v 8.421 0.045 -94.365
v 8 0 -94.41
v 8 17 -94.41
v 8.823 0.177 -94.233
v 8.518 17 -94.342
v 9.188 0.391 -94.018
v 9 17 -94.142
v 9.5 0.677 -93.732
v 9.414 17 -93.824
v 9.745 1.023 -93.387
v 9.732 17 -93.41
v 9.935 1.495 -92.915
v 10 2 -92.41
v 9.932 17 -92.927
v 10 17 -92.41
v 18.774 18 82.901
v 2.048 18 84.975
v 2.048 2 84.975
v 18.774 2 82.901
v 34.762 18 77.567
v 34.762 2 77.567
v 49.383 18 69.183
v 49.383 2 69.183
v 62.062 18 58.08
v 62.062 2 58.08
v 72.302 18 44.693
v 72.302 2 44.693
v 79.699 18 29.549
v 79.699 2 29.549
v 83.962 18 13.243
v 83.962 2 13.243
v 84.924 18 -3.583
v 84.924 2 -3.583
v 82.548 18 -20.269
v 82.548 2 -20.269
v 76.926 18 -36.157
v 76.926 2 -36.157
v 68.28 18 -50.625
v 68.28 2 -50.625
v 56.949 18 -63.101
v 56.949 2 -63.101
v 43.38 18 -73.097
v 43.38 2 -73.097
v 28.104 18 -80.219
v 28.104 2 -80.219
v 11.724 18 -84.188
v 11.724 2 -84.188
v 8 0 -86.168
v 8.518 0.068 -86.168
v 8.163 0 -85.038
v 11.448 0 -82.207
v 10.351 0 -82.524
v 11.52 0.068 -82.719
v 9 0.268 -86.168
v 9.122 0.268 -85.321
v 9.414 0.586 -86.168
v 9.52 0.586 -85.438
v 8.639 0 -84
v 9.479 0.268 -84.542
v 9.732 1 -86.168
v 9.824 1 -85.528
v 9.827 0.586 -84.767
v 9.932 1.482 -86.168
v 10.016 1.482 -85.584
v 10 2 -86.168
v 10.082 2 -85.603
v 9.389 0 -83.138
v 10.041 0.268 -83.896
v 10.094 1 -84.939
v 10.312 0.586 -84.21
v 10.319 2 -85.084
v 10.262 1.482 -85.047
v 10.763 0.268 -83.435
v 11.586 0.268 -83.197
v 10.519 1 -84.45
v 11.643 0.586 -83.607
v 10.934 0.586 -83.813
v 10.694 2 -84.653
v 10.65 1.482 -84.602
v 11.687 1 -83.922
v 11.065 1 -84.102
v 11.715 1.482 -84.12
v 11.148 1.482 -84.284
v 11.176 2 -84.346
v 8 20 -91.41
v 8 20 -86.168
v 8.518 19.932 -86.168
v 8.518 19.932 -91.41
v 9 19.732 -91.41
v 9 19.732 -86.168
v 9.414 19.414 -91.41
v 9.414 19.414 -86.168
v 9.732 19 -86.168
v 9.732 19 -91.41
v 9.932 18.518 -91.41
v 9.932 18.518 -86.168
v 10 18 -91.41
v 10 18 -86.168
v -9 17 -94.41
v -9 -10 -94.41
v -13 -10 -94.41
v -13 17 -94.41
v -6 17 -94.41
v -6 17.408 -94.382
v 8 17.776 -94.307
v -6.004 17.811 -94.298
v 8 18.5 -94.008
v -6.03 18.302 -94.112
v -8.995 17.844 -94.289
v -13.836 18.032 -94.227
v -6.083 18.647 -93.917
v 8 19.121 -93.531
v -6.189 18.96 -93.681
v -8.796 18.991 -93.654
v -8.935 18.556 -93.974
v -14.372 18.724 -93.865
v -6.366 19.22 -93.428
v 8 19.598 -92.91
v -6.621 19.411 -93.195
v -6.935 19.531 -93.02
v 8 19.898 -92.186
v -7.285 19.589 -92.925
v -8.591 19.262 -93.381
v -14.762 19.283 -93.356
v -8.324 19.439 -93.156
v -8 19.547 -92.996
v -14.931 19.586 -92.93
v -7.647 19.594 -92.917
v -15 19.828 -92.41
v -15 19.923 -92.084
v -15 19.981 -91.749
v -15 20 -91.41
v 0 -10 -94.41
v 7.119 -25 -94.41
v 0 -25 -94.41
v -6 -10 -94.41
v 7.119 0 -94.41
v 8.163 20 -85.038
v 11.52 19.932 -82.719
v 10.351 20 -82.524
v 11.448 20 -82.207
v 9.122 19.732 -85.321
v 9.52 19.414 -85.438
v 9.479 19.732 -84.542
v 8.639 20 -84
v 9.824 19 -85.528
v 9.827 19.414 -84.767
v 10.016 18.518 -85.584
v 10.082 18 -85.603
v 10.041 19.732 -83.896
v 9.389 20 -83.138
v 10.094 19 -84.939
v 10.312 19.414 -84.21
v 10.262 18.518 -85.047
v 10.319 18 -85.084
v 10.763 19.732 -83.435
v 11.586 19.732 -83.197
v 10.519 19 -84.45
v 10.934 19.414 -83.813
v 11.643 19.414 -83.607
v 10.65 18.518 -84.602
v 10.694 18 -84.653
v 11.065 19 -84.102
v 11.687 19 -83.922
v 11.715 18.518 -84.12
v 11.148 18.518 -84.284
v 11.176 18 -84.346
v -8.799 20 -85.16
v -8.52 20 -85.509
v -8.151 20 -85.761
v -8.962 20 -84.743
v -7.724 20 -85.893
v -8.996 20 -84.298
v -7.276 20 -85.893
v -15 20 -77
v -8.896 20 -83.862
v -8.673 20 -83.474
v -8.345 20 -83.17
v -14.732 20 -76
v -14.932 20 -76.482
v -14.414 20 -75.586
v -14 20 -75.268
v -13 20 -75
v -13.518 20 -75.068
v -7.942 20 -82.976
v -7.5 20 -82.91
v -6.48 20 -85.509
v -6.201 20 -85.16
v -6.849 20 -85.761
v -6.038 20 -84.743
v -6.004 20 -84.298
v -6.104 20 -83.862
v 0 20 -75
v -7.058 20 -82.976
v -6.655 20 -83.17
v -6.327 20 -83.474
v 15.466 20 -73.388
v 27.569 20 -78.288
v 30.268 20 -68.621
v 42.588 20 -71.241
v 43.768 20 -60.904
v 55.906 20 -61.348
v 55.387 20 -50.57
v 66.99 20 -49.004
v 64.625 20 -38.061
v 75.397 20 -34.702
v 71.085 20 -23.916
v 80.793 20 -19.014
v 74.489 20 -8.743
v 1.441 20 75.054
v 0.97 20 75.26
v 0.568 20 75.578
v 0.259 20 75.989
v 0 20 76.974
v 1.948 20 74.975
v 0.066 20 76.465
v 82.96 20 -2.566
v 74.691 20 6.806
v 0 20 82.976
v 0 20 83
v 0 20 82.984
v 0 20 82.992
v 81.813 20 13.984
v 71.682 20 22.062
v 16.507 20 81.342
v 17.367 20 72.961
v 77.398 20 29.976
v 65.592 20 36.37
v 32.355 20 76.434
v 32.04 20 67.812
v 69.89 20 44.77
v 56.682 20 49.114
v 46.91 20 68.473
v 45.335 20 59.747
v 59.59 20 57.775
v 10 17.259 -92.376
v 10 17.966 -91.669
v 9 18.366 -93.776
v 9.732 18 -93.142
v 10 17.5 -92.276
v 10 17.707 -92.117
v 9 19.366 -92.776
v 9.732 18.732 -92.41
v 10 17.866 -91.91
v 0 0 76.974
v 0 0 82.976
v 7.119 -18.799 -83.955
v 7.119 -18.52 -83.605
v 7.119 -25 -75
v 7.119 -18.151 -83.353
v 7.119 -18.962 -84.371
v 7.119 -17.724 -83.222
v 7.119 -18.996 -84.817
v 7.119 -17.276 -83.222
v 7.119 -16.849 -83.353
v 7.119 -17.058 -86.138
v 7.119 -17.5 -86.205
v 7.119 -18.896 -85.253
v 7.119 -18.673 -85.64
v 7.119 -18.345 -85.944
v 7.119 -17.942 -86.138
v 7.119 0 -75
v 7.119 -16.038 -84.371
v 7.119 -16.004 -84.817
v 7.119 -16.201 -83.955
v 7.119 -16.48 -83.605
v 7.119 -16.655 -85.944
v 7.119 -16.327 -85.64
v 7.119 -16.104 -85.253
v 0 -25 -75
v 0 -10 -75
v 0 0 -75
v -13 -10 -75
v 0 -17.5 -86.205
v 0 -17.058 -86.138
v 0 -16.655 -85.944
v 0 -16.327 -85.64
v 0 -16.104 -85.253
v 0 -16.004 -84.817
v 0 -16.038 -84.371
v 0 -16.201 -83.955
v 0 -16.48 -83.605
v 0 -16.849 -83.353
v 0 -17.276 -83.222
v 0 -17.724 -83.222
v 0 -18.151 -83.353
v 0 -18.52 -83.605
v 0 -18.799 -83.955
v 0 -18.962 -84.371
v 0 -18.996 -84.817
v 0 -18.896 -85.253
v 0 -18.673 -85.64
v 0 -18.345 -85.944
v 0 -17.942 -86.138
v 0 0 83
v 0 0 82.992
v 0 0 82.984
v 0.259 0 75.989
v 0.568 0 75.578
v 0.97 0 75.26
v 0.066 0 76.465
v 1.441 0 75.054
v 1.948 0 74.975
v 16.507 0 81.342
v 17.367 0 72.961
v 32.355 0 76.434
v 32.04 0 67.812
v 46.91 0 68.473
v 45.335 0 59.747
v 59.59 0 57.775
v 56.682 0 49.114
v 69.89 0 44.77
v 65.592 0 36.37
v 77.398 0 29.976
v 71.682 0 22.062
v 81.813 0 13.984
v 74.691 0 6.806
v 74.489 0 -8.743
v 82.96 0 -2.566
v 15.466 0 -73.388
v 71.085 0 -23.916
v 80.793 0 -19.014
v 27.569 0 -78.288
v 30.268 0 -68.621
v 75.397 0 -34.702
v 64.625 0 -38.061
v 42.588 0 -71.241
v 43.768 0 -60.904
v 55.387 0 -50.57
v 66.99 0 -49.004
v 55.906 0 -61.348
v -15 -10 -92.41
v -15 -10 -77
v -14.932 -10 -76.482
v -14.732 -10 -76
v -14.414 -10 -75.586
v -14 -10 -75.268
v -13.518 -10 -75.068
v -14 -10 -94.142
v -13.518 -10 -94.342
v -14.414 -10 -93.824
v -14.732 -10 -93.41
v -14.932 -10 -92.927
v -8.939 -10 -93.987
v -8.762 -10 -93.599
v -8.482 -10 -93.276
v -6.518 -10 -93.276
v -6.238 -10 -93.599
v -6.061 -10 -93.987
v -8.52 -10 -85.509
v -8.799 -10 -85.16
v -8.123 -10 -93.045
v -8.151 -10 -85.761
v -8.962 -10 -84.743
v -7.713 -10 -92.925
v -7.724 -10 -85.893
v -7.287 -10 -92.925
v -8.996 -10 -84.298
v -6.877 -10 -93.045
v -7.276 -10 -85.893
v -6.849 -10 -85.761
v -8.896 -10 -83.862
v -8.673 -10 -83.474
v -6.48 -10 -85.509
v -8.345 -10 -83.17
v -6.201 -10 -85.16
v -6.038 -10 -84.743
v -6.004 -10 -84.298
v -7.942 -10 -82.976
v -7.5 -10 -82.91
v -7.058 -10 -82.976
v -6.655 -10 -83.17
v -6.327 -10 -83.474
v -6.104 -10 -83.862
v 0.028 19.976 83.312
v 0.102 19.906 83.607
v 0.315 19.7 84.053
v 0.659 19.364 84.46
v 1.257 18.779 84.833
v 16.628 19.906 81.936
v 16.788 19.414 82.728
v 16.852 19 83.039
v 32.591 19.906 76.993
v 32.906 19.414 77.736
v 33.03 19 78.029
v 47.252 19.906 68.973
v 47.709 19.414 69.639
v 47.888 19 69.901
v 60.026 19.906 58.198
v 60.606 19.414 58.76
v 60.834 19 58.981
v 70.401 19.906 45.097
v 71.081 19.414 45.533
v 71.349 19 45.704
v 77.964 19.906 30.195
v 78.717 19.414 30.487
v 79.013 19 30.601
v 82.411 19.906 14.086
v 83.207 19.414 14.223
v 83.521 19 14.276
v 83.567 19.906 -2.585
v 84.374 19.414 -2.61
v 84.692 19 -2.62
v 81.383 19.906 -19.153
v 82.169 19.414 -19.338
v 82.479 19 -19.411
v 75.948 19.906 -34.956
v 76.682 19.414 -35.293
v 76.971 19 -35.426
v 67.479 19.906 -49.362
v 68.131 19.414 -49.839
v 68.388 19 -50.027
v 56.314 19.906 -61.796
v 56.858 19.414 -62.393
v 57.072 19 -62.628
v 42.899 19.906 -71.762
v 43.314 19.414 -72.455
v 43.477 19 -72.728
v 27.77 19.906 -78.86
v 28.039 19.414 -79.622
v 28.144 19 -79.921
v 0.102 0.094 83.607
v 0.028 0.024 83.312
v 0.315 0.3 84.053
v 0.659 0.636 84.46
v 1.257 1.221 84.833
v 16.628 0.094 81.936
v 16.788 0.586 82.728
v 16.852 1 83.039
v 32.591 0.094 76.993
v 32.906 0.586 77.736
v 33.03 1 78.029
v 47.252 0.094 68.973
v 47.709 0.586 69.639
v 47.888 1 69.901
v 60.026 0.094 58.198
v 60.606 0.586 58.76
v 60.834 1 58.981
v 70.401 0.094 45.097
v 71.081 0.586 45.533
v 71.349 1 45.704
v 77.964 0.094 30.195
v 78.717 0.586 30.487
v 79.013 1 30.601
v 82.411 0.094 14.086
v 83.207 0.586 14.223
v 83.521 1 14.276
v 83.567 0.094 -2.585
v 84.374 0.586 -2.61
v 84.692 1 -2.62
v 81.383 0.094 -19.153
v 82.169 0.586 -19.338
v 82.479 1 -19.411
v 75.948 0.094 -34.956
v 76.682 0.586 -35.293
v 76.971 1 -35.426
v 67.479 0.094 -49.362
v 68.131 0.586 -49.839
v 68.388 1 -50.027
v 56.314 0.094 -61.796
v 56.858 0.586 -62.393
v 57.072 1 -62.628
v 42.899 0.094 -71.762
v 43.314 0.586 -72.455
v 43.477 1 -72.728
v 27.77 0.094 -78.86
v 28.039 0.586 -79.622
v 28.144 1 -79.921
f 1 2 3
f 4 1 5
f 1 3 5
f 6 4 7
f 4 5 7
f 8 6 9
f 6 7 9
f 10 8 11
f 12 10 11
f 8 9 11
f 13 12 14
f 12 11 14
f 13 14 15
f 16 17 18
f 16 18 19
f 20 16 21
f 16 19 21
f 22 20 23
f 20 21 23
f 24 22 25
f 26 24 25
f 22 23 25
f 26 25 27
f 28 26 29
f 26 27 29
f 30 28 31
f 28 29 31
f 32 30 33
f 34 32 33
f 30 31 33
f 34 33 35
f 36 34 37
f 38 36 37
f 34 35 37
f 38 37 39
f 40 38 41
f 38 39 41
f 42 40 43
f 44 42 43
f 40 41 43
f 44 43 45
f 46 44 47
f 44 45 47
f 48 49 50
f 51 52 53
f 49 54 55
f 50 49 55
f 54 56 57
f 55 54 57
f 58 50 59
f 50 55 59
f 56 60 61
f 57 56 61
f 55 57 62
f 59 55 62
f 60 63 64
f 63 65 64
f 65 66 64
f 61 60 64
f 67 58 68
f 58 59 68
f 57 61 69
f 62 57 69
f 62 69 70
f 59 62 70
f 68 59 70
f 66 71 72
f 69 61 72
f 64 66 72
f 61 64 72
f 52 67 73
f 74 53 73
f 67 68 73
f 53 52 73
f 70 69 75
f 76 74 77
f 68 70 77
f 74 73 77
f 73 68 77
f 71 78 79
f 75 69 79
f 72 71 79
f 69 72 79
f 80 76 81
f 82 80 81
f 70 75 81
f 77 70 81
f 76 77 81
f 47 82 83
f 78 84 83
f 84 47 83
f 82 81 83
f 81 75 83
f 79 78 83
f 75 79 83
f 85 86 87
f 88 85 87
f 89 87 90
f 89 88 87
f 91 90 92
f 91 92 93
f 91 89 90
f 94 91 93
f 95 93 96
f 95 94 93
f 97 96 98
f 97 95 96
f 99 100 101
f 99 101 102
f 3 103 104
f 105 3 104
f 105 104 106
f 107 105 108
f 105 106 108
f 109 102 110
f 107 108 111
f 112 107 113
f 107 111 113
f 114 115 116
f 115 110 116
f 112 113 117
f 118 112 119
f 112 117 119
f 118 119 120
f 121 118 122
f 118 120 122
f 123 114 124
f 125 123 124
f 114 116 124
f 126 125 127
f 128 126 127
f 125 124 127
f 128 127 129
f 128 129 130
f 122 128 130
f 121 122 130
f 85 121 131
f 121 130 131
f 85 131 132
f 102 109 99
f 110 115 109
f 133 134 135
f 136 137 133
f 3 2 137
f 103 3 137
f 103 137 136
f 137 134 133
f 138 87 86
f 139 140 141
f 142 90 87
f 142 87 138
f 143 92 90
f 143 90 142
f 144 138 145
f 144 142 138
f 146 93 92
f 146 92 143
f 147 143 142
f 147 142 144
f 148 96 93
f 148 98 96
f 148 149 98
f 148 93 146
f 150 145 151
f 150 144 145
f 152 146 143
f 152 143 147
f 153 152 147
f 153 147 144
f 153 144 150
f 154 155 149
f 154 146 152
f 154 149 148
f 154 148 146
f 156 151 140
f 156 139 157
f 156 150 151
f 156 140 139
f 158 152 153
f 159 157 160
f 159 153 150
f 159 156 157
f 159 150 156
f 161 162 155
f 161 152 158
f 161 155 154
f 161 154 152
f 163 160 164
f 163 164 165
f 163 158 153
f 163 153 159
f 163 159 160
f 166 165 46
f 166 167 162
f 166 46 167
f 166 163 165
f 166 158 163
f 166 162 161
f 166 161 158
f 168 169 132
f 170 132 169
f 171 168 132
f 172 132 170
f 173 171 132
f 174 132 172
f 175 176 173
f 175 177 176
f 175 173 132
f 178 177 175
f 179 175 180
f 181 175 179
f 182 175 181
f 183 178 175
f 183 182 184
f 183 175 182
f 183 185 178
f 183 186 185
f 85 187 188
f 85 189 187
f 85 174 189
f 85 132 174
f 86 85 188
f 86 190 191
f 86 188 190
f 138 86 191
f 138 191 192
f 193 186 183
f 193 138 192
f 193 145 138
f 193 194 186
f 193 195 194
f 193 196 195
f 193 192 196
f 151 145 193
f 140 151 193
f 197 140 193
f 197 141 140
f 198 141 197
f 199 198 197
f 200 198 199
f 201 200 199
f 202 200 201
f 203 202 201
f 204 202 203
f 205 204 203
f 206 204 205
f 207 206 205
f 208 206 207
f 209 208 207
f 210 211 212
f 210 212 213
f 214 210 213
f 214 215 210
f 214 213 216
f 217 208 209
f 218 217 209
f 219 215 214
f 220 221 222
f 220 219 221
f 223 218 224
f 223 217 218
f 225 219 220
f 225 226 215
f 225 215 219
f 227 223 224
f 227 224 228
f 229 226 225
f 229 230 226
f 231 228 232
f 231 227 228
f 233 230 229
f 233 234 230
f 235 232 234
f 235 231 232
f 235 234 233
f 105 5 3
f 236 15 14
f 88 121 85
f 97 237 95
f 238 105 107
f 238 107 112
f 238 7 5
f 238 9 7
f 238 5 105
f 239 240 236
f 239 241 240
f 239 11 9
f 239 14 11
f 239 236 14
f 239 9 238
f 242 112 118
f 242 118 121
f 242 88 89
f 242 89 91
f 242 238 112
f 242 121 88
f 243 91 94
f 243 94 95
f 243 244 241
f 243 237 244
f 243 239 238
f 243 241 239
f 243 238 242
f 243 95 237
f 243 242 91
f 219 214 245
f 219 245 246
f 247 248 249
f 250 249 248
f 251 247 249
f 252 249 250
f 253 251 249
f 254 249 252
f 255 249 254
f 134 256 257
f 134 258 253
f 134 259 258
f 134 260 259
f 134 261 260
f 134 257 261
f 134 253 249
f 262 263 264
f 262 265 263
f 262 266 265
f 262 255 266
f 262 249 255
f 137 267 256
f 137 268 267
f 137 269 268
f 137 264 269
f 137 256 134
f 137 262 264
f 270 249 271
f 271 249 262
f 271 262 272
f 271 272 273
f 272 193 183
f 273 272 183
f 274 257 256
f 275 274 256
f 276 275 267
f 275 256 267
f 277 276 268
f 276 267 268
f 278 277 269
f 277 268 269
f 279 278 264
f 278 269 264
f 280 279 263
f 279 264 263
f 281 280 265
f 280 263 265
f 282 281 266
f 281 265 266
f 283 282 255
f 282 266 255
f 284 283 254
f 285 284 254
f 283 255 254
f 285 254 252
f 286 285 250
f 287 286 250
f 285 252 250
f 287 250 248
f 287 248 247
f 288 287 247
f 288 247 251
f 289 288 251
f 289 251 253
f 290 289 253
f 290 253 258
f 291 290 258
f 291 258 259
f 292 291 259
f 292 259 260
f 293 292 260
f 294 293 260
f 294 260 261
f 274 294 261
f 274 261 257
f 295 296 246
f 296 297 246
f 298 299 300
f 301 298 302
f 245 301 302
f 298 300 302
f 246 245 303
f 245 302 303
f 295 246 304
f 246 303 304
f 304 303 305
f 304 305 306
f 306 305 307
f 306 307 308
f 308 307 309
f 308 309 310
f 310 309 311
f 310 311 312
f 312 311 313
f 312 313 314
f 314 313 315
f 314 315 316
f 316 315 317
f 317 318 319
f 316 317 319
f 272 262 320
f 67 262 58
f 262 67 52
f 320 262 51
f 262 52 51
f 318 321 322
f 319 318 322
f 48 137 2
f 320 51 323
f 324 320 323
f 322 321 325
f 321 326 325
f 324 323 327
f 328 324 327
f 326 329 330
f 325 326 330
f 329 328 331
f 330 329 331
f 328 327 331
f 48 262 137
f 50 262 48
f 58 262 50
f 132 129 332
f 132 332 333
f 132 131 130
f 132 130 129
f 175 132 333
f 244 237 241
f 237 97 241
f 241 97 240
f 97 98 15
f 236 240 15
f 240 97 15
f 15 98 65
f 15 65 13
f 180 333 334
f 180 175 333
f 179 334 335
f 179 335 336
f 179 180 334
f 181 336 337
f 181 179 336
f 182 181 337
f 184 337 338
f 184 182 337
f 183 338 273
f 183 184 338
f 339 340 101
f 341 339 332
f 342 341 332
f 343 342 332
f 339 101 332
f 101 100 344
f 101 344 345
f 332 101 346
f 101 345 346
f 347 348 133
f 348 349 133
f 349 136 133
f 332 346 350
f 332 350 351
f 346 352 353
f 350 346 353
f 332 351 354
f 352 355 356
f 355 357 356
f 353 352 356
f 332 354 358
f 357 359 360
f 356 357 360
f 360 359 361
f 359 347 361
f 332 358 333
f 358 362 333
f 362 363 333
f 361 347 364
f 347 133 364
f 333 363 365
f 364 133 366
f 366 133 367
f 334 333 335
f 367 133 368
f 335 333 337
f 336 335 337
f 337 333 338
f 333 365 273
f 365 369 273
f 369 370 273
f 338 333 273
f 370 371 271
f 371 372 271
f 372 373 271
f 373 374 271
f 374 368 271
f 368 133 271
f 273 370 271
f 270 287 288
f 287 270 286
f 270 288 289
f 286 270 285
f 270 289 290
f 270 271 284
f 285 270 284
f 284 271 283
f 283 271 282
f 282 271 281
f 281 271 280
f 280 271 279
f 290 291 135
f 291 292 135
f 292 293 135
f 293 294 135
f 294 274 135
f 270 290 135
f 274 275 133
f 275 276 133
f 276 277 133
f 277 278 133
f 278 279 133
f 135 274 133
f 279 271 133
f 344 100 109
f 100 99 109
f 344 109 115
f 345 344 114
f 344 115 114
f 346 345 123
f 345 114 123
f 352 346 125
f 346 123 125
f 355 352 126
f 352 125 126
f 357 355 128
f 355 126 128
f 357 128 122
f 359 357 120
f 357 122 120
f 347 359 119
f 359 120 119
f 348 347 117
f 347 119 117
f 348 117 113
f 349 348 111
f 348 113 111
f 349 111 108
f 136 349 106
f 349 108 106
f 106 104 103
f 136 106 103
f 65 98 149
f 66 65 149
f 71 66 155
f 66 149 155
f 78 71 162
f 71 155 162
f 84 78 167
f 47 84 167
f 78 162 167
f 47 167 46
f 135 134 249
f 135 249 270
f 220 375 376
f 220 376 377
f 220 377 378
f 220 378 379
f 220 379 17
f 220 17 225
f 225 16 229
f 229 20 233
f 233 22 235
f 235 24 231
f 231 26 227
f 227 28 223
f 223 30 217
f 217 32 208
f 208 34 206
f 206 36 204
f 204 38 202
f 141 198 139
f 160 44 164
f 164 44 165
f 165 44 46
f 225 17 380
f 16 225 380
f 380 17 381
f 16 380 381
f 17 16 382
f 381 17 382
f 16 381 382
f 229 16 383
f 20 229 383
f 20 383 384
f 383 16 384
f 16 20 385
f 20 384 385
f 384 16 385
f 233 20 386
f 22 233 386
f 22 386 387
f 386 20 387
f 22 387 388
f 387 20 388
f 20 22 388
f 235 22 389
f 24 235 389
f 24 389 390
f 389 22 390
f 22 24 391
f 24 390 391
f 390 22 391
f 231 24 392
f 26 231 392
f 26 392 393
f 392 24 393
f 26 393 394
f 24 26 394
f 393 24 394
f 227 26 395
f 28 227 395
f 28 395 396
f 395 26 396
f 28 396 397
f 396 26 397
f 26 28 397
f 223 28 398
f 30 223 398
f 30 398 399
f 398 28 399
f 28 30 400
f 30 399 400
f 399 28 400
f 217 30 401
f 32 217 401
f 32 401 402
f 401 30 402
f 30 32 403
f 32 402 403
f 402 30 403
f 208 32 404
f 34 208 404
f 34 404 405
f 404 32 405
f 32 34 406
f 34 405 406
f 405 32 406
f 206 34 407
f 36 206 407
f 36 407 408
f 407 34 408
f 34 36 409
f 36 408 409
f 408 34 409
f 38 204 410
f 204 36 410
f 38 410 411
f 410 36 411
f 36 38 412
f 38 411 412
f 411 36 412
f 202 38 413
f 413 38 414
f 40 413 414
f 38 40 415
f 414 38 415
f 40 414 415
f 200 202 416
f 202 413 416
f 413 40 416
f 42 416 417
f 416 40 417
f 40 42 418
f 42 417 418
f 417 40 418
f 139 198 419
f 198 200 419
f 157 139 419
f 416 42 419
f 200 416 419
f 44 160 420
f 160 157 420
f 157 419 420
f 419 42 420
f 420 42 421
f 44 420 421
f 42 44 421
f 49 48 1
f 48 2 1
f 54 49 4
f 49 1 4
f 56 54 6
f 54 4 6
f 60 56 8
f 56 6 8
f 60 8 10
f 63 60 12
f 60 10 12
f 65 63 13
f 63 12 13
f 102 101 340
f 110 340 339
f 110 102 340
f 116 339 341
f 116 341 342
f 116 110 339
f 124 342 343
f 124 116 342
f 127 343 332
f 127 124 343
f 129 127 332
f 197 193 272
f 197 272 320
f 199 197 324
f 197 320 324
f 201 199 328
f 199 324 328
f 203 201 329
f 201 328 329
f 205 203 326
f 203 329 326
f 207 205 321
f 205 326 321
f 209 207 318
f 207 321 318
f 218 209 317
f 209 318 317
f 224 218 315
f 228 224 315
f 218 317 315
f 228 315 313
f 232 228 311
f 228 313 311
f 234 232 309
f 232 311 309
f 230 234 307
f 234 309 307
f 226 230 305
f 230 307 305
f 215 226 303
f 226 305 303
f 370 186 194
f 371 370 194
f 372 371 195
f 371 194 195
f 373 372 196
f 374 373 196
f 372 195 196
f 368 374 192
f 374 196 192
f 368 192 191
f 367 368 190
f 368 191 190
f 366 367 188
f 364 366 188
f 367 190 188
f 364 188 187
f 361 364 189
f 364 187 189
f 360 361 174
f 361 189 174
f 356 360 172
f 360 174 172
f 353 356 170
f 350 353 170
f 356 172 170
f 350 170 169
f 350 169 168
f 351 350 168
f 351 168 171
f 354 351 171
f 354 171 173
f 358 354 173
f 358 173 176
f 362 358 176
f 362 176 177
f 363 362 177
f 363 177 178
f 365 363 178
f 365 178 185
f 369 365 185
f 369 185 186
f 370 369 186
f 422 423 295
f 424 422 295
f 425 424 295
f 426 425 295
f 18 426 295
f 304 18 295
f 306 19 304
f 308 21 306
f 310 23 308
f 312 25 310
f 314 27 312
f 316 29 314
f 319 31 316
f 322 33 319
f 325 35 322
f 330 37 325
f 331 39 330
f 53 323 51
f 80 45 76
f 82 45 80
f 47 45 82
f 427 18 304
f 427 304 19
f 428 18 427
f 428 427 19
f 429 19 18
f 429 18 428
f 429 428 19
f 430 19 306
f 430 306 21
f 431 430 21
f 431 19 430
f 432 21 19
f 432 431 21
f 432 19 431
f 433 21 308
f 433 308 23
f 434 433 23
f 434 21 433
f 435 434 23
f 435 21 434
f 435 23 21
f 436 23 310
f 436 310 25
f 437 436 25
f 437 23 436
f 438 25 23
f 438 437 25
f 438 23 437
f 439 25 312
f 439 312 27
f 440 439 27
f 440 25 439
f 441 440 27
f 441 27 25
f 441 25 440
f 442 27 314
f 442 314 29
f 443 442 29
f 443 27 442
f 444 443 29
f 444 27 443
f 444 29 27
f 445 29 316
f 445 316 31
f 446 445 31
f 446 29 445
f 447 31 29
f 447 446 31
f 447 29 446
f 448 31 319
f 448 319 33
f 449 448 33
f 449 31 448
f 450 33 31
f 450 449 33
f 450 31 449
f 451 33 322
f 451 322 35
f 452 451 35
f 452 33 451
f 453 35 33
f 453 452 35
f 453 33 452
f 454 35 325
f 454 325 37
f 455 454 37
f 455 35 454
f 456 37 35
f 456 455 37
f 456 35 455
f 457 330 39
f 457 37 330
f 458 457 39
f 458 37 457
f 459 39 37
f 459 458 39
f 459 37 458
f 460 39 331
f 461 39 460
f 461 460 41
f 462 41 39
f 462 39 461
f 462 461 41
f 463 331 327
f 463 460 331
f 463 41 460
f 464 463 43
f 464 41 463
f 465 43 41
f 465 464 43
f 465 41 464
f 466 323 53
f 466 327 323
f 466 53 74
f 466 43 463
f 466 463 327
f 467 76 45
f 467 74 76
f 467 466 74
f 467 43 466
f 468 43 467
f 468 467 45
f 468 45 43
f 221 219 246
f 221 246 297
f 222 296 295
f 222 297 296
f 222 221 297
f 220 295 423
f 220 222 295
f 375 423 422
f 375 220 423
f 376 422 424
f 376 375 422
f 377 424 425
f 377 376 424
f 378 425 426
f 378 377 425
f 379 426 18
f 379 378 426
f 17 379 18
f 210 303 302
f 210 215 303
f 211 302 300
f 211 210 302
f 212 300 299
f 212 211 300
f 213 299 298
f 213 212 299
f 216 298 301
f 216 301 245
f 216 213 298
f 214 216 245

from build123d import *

# Parameters (mm, degrees)
BOSS_EXTRUDE1_DEPTH = 20
SKETCH3_W           = 19.409715081
SKETCH3_H           = 30
BOSS_EXTRUDE3_DEPTH = 15
FILLET1_R           = 2
SKETCH4_R           = 1.5
CUT_EXTRUDE1_DEPTH  = 131.530434453
FILLET2_R           = 3
SKETCH7_W           = 7.118887736
SKETCH7_H           = 19.409715081
BOSS_EXTRUDE5_DEPTH = 25
CUT_EXTRUDE3_REACH  = 126.915
SKETCH9_R           = 1.5


with BuildPart() as part:
    # Sketch1 → Boss-Extrude1 (new body)
    with BuildSketch(Plane(origin=(0, 0, 0), x_dir=(1, 0, 0), z_dir=(0, 1, 0))):
        with BuildLine():
            Line((0, -75), (0, -85))
            ThreePointArc((0, -85), (84.852300446, -5.008703332), (10, 84.409715081))
            Line((10, 84.409715081), (10, 94.409715081))
            Line((10, 94.409715081), (0, 94.409715081))
            Line((0, 94.409715081), (0, 75))
            ThreePointArc((0, 75), (75, 0), (0, -75))
        make_face()
    extrude(amount=BOSS_EXTRUDE1_DEPTH)

    # Sketch3 → Boss-Extrude3 (add)
    with BuildSketch(Plane.ZY):
        with Locations((-84.704857541, 5)):
            Rectangle(SKETCH3_W, SKETCH3_H)
    extrude(amount=BOSS_EXTRUDE3_DEPTH)

    # Fillet1
    fillet1_edges = [part.edges().sort_by_distance(p)[0] for p in [
        (84.852300446, 20, 5.008703332),
        (10, 10, -94.409715081),
        (10, 10, -84.409715081),
        (0, 10, 85),
        (0, 10, 75),
        (10, 20, -89.409715081),
        (-15, 5, -94.409715081),
        (-15, 5, -75),
        (10, 0, -89.409715081),
        (84.852300446, 0, 5.008703332),
    ]]
    fillet(fillet1_edges, radius=FILLET1_R)

    # Sketch4 → Cut-Extrude1 (cut, through all)
    with BuildSketch(Plane(origin=(0, 20, 0), x_dir=(1, 0, 0), z_dir=(0, 1, 0))):
        with Locations(Location((-7.5, 84.409715081, 0), (0, 0, 270))):
            Circle(SKETCH4_R)
        with Locations((-7.5, 94.409715081)):
            Circle(SKETCH4_R)
    extrude(amount=-CUT_EXTRUDE1_DEPTH, mode=Mode.SUBTRACT)

    # Fillet2
    # the kernel refuses this fillet: 3 mm, written as the material it takes off along each edge
    with BuildSketch(Plane(origin=(10, 17, -91.409715081), x_dir=(0, 0, -1), z_dir=(0, -1, 0))) as fillet2_piece_1:
        with BuildLine():
            CenterArc((1, -2), 2, 0, 90)
            Line((3, -2), (3, 0))
            Line((3, 0), (1, 0))
        make_face()
    revolve(axis=Axis((10, 17, -91.409715081), (1, 0, 0)), revolution_arc=90, mode=Mode.SUBTRACT)
    with BuildSketch(Plane(origin=(-20.5, 20, -94.409715081), x_dir=(0, 0, 1), z_dir=(1, 0, 0))) as fillet2_piece_2:
        with BuildLine():
            CenterArc((FILLET2_R, FILLET2_R), FILLET2_R, 180, 90)
            Line((0, FILLET2_R), (0, 0))
            Line((0, 0), (FILLET2_R, 0))
        make_face()
    extrude(amount=19, mode=Mode.SUBTRACT)
    with BuildSketch(Plane(origin=(-13.5, 20, -94.409715081), x_dir=(0, -1, 0), z_dir=(1, 0, 0))) as fillet2_piece_3:
        with BuildLine():
            CenterArc((FILLET2_R, -FILLET2_R), FILLET2_R, 90, 90)
            Line((0, -FILLET2_R), (0, 0))
            Line((0, 0), (FILLET2_R, 0))
        make_face()
    extrude(amount=23.5, mode=Mode.SUBTRACT)

    # Sketch7 → Boss-Extrude5 (add)
    with BuildSketch(Plane(origin=(0, 0, 0), x_dir=(-1, 0, 0), z_dir=(0, -1, 0))):
        with Locations((-3.559443868, 84.704857541)):
            Rectangle(SKETCH7_W, SKETCH7_H)
    extrude(amount=BOSS_EXTRUDE5_DEPTH)

    # Sketch9 → Cut-Extrude3 (cut, up to next)
    with BuildSketch(Plane(origin=(7.118887736, 0, 0), x_dir=(0, 0, -1), z_dir=(1, 0, 0)), mode=Mode.PRIVATE) as cut_extrude3_sk1:
        with Locations((84.70485754, -17.5)):
            Circle(SKETCH9_R)
    cut_extrude3_tool1 = extrude(cut_extrude3_sk1.sketch, amount=-CUT_EXTRUDE3_REACH, mode=Mode.PRIVATE) & part.part
    add(cut_extrude3_tool1.solids().sort_by_distance((7.118888, -17.5, -84.704858))[0], mode=Mode.SUBTRACT)


solid = part.part
